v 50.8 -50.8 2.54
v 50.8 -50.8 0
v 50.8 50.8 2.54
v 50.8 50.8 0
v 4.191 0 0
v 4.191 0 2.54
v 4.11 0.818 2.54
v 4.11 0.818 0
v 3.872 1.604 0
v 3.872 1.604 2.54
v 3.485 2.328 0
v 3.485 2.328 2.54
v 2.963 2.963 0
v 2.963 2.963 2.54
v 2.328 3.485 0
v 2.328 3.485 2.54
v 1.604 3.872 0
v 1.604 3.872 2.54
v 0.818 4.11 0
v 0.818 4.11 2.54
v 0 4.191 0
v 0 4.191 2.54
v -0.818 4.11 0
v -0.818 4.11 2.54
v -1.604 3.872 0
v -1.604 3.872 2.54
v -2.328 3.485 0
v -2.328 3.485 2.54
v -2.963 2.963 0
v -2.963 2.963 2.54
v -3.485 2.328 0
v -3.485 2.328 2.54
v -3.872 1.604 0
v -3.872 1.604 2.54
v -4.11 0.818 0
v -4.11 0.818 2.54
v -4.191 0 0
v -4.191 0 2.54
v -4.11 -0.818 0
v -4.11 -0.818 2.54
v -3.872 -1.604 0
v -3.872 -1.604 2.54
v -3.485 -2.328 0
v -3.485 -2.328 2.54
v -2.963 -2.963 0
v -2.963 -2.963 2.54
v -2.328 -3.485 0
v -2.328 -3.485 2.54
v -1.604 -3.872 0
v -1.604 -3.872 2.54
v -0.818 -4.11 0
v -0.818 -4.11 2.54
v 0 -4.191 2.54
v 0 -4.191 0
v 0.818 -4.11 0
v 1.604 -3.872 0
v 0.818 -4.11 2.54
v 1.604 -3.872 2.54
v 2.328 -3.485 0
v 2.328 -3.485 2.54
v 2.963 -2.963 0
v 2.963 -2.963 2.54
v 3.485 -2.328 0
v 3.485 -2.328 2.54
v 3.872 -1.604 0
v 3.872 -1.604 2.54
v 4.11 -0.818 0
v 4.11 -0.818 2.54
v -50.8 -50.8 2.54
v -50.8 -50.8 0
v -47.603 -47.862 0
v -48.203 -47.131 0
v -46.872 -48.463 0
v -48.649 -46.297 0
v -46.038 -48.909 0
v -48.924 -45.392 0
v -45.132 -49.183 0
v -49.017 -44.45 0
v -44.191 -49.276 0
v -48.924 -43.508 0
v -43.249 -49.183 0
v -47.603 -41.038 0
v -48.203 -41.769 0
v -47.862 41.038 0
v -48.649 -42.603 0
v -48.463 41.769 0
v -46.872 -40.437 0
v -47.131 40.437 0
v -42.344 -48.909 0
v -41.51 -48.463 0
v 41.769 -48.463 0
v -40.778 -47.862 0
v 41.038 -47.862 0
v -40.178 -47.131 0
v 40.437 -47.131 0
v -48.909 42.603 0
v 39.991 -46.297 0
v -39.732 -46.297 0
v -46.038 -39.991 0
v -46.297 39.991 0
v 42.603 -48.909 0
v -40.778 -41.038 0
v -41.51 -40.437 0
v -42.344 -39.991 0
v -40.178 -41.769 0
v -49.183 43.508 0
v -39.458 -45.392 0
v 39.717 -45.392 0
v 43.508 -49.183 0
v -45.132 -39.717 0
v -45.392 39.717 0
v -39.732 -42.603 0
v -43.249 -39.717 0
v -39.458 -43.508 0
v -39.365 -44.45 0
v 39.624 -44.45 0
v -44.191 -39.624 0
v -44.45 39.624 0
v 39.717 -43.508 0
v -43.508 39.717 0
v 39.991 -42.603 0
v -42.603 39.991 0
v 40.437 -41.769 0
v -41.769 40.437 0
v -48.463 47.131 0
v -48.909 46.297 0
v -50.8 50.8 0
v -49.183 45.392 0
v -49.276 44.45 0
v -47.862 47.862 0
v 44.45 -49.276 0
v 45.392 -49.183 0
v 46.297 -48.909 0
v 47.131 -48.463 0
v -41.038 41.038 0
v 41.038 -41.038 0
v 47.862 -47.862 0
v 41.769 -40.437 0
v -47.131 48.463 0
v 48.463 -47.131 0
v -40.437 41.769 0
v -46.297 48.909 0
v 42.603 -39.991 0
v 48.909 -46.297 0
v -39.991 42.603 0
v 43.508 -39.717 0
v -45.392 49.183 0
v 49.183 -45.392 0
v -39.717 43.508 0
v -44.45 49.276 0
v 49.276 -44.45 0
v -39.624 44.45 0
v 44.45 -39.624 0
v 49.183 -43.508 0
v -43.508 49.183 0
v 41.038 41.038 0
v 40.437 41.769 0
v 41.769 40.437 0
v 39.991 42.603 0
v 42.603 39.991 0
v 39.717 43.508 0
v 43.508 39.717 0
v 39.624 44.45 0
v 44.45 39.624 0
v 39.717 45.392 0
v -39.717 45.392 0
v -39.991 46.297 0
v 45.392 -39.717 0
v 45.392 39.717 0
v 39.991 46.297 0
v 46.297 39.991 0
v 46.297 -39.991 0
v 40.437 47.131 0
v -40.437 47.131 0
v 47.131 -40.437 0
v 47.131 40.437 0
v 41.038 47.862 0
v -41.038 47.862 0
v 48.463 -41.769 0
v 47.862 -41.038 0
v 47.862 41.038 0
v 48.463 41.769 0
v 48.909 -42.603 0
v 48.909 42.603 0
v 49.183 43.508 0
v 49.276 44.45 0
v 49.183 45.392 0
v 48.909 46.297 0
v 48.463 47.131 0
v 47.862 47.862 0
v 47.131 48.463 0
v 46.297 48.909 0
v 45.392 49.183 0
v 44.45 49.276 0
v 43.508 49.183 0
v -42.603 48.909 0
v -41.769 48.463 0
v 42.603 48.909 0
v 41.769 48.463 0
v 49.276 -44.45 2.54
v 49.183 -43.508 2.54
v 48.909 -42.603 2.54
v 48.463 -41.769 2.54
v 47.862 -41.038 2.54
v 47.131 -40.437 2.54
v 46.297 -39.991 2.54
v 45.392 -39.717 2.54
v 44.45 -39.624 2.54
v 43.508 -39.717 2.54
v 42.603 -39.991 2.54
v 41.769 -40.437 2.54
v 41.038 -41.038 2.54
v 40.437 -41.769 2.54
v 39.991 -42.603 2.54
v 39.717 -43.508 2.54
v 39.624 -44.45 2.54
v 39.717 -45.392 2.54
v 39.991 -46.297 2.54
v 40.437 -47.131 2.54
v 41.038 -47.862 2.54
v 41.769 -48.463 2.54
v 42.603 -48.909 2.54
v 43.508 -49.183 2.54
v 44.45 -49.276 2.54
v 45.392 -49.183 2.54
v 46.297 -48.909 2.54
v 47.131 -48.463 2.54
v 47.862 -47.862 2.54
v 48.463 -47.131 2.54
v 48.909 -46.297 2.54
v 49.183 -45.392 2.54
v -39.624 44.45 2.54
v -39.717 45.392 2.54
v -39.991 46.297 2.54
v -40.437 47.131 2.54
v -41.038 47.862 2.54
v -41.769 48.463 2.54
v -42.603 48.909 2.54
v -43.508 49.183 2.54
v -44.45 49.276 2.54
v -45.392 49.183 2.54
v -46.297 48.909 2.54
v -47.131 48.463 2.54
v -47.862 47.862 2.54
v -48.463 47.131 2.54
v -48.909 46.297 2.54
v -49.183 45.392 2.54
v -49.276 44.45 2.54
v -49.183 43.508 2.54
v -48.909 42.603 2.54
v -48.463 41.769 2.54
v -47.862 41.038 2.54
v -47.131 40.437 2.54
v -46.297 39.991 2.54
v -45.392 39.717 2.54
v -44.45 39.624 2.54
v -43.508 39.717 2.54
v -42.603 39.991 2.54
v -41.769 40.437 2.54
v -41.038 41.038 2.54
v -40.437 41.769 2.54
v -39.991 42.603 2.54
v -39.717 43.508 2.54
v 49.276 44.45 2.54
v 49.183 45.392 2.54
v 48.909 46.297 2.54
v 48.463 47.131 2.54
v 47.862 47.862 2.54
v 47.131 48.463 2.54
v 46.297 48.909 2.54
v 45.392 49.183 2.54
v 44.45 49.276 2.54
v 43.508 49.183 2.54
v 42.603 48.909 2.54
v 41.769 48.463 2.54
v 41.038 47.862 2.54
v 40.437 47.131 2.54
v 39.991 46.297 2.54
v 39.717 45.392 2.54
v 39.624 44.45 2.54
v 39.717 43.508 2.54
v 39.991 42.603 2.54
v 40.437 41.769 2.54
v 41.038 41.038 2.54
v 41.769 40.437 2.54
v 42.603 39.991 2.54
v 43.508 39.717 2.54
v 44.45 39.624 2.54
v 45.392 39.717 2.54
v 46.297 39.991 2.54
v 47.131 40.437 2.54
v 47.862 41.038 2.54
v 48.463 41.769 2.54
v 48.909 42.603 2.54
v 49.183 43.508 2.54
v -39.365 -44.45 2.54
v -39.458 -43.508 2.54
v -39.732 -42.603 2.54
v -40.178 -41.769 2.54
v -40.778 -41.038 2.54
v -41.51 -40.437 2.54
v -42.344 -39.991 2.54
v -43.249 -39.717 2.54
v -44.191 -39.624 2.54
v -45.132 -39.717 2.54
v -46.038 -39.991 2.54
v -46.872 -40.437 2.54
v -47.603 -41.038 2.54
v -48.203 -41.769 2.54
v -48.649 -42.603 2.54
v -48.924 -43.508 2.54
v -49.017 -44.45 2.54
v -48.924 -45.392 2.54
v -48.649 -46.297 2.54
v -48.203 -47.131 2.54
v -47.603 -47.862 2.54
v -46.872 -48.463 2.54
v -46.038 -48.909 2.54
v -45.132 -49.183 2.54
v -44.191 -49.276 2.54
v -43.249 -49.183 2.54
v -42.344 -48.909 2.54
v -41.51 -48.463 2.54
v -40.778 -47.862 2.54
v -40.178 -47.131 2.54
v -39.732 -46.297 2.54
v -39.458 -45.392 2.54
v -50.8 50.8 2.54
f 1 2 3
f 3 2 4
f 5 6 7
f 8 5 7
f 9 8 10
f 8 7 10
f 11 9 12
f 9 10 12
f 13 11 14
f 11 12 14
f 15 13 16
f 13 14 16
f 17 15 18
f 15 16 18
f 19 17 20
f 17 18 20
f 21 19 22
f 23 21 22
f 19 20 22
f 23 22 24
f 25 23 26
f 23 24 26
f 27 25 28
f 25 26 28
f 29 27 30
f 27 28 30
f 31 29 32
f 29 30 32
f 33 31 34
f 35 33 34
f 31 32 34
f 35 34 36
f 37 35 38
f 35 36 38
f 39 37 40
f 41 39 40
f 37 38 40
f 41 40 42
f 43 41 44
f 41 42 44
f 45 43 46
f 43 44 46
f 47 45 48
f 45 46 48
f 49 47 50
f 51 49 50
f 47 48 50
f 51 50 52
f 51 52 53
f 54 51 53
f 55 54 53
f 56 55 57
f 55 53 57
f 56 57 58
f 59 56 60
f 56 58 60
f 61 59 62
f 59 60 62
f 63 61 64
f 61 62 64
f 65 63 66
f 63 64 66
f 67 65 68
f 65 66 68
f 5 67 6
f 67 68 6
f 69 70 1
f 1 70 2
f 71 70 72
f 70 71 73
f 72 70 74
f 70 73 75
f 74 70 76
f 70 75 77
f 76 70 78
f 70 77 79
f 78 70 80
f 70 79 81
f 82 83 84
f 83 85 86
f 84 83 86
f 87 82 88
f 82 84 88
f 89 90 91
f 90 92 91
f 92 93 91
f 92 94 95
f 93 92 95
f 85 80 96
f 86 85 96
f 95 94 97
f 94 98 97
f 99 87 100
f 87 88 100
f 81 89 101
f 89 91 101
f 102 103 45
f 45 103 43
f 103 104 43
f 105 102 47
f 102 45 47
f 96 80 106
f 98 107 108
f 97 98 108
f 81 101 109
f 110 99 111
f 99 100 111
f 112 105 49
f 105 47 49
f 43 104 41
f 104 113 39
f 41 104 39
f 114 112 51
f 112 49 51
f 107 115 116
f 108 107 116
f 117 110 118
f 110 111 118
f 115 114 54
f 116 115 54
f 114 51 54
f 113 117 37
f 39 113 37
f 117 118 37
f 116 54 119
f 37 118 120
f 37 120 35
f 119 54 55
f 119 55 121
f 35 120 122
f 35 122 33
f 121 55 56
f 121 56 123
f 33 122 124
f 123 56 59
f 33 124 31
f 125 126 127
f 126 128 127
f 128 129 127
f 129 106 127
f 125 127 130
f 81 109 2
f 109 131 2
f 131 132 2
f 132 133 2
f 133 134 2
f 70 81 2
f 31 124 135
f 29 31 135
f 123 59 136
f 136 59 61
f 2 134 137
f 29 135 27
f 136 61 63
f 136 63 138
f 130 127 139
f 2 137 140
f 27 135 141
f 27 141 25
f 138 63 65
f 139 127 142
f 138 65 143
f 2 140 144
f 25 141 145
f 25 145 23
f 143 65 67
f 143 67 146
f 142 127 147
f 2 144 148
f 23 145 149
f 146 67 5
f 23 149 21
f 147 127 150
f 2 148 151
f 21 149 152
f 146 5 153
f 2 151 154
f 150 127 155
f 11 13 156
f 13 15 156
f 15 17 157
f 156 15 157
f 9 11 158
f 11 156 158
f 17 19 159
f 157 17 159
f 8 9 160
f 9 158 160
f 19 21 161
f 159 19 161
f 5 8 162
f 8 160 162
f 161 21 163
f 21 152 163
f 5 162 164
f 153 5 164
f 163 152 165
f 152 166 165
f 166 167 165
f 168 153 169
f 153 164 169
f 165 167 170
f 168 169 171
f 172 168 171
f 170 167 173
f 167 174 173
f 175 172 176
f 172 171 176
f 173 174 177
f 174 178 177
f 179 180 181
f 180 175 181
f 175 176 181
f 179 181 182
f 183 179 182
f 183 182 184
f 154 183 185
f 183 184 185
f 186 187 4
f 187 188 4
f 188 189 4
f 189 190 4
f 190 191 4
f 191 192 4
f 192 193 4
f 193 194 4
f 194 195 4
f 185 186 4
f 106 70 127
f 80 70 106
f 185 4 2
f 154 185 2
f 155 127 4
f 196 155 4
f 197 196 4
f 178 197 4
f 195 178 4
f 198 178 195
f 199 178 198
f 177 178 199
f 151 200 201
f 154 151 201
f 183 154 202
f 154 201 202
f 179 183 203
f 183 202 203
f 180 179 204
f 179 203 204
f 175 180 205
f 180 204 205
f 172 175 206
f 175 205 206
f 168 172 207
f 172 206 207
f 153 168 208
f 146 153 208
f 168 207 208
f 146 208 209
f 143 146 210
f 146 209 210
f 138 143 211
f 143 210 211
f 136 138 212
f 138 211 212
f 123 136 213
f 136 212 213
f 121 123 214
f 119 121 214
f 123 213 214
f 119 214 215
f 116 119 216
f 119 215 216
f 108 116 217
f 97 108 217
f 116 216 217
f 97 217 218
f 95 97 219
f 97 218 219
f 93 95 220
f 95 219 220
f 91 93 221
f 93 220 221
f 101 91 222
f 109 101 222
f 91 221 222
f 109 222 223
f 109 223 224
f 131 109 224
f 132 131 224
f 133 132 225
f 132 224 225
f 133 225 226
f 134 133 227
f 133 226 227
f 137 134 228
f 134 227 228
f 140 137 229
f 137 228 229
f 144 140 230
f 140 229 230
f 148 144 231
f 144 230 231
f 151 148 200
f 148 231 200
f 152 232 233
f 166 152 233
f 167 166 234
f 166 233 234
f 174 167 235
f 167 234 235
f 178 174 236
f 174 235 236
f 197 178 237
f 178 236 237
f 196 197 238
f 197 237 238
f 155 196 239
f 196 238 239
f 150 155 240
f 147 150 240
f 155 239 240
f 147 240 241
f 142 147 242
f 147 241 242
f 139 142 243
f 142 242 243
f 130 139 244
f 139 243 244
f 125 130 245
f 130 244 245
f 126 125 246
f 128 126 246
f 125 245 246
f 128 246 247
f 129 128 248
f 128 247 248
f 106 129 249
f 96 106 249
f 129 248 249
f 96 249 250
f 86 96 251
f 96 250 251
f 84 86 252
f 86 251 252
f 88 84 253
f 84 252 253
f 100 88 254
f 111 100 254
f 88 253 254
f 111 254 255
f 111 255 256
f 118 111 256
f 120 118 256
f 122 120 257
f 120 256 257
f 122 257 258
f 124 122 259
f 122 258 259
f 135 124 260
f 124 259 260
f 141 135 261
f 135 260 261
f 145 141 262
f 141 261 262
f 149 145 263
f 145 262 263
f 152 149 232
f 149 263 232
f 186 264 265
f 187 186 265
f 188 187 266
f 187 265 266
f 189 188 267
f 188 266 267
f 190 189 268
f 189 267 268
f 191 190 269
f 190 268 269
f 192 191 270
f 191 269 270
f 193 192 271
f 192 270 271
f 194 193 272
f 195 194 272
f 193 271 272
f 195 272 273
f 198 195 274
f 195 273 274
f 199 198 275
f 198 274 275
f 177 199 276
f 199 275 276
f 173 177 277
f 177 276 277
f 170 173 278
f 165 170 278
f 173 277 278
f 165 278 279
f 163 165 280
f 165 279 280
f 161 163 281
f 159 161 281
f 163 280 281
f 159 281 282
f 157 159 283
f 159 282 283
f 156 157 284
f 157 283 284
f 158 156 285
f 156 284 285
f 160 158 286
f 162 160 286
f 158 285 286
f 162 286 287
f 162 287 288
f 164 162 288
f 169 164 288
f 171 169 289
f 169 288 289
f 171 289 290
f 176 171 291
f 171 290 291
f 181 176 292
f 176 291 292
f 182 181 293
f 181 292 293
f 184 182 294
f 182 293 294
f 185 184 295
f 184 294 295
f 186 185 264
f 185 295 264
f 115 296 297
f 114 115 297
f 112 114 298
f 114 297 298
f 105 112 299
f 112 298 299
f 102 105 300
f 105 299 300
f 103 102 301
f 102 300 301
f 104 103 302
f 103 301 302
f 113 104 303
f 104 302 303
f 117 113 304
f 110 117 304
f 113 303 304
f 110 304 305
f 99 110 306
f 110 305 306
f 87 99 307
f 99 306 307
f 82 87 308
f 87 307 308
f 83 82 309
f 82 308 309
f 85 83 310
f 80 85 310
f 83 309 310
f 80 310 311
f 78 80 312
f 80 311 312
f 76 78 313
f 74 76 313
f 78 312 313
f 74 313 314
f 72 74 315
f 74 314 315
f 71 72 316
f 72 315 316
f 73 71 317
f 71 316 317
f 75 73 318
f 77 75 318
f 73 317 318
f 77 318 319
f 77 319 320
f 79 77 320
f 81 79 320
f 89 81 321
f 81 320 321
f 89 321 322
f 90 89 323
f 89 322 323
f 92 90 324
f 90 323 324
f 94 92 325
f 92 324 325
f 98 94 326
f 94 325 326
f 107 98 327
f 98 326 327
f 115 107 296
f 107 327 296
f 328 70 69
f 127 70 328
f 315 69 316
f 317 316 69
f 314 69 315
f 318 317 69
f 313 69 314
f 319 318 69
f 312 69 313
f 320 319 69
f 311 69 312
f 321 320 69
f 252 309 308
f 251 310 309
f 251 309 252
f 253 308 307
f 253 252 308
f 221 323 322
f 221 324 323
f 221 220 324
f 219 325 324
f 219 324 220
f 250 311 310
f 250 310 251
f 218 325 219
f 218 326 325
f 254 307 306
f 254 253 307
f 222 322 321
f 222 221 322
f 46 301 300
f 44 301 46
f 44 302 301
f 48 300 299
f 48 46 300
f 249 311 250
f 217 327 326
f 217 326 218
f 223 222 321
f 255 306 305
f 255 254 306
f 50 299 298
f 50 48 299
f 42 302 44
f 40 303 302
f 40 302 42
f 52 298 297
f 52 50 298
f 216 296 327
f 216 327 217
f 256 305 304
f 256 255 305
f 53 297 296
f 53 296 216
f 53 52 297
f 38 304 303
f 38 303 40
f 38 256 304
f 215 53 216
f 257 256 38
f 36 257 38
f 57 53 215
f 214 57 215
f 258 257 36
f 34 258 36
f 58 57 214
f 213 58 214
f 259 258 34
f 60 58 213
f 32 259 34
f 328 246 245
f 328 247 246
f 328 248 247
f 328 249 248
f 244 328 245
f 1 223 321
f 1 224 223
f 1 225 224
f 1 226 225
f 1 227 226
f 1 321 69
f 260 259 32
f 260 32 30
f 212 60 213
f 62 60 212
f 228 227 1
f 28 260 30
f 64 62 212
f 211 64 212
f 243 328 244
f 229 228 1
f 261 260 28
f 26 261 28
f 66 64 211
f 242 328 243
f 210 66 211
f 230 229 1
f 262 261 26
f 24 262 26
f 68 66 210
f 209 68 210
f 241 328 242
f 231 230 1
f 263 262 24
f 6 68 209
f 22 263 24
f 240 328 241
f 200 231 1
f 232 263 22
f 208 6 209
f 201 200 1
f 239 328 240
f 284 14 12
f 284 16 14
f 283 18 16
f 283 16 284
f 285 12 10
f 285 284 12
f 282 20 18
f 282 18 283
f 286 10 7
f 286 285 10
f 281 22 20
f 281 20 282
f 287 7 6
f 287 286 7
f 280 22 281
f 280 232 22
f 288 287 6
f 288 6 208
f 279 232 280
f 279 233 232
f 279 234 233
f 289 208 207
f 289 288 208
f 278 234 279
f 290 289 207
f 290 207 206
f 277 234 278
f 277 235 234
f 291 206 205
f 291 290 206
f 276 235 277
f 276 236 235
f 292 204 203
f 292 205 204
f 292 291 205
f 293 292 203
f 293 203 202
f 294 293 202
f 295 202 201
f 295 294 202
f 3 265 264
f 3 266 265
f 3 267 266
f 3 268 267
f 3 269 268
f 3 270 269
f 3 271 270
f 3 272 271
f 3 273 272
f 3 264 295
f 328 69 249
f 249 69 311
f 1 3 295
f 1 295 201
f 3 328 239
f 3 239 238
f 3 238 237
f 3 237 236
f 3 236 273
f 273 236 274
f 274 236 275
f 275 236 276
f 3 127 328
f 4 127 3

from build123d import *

# Parameters (mm, degrees)
SKETCH1_W           = 101.6
SKETCH1_H           = 101.6
BOSS_EXTRUDE1_DEPTH = 2.54
SKETCH3_R           = 4.191
CUT_EXTRUDE2_DEPTH  = 2.54
SKETCH2_R           = 4.826
CUT_EXTRUDE3_DEPTH  = 2.54


with BuildPart() as part:
    # Sketch1 → Boss-Extrude1 (new body)
    with BuildSketch(Plane.XY):
        Rectangle(SKETCH1_W, SKETCH1_H)
    extrude(amount=BOSS_EXTRUDE1_DEPTH)

    # Sketch3 → Cut-Extrude2 (cut)
    with BuildSketch(Plane.XY.offset(2.54)):
        Circle(SKETCH3_R)
    extrude(amount=-CUT_EXTRUDE2_DEPTH, mode=Mode.SUBTRACT)

    # Sketch2 → Cut-Extrude3 (cut)
    with BuildSketch(Plane.XY.offset(2.54)):
        with Locations((-44.45, 44.45)):
            Circle(SKETCH2_R)
        with Locations((44.45, 44.45)):
            Circle(SKETCH2_R)
        with Locations((44.45, -44.45)):
            Circle(SKETCH2_R)
        with Locations((-44.190779842, -44.45)):
            Circle(SKETCH2_R)
    extrude(amount=-CUT_EXTRUDE3_DEPTH, mode=Mode.SUBTRACT)


solid = part.part
